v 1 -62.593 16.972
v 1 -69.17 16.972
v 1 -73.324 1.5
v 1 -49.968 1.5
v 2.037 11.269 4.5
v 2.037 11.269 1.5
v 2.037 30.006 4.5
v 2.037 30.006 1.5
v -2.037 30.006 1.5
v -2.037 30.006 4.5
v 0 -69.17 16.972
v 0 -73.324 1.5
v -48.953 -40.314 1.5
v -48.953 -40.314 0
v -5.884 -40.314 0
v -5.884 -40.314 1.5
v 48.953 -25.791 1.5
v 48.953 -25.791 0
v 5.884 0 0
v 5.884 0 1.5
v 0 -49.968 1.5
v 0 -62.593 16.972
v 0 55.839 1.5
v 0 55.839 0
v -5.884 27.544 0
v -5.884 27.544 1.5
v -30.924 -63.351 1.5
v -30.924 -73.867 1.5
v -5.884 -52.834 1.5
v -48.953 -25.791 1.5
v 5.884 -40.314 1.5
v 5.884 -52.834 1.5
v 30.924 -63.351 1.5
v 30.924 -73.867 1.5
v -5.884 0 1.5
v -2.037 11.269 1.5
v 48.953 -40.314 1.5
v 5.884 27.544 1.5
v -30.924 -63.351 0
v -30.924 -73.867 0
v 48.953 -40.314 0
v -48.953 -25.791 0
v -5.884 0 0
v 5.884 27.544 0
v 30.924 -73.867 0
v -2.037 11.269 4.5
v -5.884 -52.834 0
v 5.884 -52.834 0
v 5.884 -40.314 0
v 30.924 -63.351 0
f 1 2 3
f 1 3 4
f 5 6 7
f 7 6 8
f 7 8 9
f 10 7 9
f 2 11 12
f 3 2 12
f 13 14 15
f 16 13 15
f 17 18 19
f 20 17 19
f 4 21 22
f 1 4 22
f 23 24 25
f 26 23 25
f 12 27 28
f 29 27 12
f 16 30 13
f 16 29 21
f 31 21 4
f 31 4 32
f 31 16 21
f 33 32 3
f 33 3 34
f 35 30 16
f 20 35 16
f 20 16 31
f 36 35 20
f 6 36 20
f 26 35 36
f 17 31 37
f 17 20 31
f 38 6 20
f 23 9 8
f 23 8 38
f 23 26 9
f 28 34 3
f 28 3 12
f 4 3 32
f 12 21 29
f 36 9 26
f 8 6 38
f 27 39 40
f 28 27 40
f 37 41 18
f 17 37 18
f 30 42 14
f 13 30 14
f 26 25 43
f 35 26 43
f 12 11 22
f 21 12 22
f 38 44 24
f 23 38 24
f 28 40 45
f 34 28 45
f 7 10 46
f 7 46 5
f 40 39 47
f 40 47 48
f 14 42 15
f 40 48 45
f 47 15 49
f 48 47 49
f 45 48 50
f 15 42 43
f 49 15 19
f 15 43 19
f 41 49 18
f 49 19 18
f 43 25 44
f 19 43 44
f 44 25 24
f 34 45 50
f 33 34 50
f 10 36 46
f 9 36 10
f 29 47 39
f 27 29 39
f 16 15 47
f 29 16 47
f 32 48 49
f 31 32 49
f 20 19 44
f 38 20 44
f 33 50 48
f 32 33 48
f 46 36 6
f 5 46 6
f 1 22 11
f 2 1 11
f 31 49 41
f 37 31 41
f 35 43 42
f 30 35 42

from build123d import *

# Parameters (mm, degrees)
F1_DEPTH = 1.5
F2_W     = 2.0366392564
F2_H     = 18.7370711938
F3_DEPTH = 3
F5_DEPTH = 1


# Not quite as in the source:
# - a feature names something its author has since deleted; it is built from what else it names


with BuildPart() as f1:
    # F0 (on Top) → F1 (new body)
    with BuildSketch(Plane.XY):
        Polygon((5.8843404986, 27.5437198579), (0, 55.8386333287), (-5.8843404986, 27.5437198579), (-5.8843404986, 0), (-48.9527061582, -25.7909391075), (-48.9527061582, -40.313988924), (-5.8843404986, -40.313988924), (-5.8843404986, -52.8338626027), (-30.9240873903, -63.3505582809), (-30.9240873903, -73.8672539592), (0, -73.8672539592), (30.9240873903, -73.8672539592), (30.9240873903, -63.3505582809), (5.8843404986, -52.8338626027), (5.8843404986, -40.313988924), (48.9527061582, -40.313988924), (48.9527061582, -25.7909391075), (5.8843404986, 0), align=None)
    extrude(amount=F1_DEPTH)

    # F2 (on face) → F3 (join)
    with BuildSketch(Plane.XY.offset(1.5)):
        with Locations((-1.0183196282, 20.6379326992)):
            Rectangle(F2_W, F2_H)
        with Locations((1.0183196282, 20.6379326992)):
            Rectangle(F2_W, F2_H)
    extrude(amount=F3_DEPTH)

    # F4 (on Right) → F5 (join)
    with BuildSketch(Plane.YZ):
        Polygon((-69.1700602547, 16.9719830155), (-73.7262964249, 0), (-48.7435348332, 0), (-62.592677772, 16.9719830155), align=None)
    extrude(amount=F5_DEPTH)


solid = f1.part
